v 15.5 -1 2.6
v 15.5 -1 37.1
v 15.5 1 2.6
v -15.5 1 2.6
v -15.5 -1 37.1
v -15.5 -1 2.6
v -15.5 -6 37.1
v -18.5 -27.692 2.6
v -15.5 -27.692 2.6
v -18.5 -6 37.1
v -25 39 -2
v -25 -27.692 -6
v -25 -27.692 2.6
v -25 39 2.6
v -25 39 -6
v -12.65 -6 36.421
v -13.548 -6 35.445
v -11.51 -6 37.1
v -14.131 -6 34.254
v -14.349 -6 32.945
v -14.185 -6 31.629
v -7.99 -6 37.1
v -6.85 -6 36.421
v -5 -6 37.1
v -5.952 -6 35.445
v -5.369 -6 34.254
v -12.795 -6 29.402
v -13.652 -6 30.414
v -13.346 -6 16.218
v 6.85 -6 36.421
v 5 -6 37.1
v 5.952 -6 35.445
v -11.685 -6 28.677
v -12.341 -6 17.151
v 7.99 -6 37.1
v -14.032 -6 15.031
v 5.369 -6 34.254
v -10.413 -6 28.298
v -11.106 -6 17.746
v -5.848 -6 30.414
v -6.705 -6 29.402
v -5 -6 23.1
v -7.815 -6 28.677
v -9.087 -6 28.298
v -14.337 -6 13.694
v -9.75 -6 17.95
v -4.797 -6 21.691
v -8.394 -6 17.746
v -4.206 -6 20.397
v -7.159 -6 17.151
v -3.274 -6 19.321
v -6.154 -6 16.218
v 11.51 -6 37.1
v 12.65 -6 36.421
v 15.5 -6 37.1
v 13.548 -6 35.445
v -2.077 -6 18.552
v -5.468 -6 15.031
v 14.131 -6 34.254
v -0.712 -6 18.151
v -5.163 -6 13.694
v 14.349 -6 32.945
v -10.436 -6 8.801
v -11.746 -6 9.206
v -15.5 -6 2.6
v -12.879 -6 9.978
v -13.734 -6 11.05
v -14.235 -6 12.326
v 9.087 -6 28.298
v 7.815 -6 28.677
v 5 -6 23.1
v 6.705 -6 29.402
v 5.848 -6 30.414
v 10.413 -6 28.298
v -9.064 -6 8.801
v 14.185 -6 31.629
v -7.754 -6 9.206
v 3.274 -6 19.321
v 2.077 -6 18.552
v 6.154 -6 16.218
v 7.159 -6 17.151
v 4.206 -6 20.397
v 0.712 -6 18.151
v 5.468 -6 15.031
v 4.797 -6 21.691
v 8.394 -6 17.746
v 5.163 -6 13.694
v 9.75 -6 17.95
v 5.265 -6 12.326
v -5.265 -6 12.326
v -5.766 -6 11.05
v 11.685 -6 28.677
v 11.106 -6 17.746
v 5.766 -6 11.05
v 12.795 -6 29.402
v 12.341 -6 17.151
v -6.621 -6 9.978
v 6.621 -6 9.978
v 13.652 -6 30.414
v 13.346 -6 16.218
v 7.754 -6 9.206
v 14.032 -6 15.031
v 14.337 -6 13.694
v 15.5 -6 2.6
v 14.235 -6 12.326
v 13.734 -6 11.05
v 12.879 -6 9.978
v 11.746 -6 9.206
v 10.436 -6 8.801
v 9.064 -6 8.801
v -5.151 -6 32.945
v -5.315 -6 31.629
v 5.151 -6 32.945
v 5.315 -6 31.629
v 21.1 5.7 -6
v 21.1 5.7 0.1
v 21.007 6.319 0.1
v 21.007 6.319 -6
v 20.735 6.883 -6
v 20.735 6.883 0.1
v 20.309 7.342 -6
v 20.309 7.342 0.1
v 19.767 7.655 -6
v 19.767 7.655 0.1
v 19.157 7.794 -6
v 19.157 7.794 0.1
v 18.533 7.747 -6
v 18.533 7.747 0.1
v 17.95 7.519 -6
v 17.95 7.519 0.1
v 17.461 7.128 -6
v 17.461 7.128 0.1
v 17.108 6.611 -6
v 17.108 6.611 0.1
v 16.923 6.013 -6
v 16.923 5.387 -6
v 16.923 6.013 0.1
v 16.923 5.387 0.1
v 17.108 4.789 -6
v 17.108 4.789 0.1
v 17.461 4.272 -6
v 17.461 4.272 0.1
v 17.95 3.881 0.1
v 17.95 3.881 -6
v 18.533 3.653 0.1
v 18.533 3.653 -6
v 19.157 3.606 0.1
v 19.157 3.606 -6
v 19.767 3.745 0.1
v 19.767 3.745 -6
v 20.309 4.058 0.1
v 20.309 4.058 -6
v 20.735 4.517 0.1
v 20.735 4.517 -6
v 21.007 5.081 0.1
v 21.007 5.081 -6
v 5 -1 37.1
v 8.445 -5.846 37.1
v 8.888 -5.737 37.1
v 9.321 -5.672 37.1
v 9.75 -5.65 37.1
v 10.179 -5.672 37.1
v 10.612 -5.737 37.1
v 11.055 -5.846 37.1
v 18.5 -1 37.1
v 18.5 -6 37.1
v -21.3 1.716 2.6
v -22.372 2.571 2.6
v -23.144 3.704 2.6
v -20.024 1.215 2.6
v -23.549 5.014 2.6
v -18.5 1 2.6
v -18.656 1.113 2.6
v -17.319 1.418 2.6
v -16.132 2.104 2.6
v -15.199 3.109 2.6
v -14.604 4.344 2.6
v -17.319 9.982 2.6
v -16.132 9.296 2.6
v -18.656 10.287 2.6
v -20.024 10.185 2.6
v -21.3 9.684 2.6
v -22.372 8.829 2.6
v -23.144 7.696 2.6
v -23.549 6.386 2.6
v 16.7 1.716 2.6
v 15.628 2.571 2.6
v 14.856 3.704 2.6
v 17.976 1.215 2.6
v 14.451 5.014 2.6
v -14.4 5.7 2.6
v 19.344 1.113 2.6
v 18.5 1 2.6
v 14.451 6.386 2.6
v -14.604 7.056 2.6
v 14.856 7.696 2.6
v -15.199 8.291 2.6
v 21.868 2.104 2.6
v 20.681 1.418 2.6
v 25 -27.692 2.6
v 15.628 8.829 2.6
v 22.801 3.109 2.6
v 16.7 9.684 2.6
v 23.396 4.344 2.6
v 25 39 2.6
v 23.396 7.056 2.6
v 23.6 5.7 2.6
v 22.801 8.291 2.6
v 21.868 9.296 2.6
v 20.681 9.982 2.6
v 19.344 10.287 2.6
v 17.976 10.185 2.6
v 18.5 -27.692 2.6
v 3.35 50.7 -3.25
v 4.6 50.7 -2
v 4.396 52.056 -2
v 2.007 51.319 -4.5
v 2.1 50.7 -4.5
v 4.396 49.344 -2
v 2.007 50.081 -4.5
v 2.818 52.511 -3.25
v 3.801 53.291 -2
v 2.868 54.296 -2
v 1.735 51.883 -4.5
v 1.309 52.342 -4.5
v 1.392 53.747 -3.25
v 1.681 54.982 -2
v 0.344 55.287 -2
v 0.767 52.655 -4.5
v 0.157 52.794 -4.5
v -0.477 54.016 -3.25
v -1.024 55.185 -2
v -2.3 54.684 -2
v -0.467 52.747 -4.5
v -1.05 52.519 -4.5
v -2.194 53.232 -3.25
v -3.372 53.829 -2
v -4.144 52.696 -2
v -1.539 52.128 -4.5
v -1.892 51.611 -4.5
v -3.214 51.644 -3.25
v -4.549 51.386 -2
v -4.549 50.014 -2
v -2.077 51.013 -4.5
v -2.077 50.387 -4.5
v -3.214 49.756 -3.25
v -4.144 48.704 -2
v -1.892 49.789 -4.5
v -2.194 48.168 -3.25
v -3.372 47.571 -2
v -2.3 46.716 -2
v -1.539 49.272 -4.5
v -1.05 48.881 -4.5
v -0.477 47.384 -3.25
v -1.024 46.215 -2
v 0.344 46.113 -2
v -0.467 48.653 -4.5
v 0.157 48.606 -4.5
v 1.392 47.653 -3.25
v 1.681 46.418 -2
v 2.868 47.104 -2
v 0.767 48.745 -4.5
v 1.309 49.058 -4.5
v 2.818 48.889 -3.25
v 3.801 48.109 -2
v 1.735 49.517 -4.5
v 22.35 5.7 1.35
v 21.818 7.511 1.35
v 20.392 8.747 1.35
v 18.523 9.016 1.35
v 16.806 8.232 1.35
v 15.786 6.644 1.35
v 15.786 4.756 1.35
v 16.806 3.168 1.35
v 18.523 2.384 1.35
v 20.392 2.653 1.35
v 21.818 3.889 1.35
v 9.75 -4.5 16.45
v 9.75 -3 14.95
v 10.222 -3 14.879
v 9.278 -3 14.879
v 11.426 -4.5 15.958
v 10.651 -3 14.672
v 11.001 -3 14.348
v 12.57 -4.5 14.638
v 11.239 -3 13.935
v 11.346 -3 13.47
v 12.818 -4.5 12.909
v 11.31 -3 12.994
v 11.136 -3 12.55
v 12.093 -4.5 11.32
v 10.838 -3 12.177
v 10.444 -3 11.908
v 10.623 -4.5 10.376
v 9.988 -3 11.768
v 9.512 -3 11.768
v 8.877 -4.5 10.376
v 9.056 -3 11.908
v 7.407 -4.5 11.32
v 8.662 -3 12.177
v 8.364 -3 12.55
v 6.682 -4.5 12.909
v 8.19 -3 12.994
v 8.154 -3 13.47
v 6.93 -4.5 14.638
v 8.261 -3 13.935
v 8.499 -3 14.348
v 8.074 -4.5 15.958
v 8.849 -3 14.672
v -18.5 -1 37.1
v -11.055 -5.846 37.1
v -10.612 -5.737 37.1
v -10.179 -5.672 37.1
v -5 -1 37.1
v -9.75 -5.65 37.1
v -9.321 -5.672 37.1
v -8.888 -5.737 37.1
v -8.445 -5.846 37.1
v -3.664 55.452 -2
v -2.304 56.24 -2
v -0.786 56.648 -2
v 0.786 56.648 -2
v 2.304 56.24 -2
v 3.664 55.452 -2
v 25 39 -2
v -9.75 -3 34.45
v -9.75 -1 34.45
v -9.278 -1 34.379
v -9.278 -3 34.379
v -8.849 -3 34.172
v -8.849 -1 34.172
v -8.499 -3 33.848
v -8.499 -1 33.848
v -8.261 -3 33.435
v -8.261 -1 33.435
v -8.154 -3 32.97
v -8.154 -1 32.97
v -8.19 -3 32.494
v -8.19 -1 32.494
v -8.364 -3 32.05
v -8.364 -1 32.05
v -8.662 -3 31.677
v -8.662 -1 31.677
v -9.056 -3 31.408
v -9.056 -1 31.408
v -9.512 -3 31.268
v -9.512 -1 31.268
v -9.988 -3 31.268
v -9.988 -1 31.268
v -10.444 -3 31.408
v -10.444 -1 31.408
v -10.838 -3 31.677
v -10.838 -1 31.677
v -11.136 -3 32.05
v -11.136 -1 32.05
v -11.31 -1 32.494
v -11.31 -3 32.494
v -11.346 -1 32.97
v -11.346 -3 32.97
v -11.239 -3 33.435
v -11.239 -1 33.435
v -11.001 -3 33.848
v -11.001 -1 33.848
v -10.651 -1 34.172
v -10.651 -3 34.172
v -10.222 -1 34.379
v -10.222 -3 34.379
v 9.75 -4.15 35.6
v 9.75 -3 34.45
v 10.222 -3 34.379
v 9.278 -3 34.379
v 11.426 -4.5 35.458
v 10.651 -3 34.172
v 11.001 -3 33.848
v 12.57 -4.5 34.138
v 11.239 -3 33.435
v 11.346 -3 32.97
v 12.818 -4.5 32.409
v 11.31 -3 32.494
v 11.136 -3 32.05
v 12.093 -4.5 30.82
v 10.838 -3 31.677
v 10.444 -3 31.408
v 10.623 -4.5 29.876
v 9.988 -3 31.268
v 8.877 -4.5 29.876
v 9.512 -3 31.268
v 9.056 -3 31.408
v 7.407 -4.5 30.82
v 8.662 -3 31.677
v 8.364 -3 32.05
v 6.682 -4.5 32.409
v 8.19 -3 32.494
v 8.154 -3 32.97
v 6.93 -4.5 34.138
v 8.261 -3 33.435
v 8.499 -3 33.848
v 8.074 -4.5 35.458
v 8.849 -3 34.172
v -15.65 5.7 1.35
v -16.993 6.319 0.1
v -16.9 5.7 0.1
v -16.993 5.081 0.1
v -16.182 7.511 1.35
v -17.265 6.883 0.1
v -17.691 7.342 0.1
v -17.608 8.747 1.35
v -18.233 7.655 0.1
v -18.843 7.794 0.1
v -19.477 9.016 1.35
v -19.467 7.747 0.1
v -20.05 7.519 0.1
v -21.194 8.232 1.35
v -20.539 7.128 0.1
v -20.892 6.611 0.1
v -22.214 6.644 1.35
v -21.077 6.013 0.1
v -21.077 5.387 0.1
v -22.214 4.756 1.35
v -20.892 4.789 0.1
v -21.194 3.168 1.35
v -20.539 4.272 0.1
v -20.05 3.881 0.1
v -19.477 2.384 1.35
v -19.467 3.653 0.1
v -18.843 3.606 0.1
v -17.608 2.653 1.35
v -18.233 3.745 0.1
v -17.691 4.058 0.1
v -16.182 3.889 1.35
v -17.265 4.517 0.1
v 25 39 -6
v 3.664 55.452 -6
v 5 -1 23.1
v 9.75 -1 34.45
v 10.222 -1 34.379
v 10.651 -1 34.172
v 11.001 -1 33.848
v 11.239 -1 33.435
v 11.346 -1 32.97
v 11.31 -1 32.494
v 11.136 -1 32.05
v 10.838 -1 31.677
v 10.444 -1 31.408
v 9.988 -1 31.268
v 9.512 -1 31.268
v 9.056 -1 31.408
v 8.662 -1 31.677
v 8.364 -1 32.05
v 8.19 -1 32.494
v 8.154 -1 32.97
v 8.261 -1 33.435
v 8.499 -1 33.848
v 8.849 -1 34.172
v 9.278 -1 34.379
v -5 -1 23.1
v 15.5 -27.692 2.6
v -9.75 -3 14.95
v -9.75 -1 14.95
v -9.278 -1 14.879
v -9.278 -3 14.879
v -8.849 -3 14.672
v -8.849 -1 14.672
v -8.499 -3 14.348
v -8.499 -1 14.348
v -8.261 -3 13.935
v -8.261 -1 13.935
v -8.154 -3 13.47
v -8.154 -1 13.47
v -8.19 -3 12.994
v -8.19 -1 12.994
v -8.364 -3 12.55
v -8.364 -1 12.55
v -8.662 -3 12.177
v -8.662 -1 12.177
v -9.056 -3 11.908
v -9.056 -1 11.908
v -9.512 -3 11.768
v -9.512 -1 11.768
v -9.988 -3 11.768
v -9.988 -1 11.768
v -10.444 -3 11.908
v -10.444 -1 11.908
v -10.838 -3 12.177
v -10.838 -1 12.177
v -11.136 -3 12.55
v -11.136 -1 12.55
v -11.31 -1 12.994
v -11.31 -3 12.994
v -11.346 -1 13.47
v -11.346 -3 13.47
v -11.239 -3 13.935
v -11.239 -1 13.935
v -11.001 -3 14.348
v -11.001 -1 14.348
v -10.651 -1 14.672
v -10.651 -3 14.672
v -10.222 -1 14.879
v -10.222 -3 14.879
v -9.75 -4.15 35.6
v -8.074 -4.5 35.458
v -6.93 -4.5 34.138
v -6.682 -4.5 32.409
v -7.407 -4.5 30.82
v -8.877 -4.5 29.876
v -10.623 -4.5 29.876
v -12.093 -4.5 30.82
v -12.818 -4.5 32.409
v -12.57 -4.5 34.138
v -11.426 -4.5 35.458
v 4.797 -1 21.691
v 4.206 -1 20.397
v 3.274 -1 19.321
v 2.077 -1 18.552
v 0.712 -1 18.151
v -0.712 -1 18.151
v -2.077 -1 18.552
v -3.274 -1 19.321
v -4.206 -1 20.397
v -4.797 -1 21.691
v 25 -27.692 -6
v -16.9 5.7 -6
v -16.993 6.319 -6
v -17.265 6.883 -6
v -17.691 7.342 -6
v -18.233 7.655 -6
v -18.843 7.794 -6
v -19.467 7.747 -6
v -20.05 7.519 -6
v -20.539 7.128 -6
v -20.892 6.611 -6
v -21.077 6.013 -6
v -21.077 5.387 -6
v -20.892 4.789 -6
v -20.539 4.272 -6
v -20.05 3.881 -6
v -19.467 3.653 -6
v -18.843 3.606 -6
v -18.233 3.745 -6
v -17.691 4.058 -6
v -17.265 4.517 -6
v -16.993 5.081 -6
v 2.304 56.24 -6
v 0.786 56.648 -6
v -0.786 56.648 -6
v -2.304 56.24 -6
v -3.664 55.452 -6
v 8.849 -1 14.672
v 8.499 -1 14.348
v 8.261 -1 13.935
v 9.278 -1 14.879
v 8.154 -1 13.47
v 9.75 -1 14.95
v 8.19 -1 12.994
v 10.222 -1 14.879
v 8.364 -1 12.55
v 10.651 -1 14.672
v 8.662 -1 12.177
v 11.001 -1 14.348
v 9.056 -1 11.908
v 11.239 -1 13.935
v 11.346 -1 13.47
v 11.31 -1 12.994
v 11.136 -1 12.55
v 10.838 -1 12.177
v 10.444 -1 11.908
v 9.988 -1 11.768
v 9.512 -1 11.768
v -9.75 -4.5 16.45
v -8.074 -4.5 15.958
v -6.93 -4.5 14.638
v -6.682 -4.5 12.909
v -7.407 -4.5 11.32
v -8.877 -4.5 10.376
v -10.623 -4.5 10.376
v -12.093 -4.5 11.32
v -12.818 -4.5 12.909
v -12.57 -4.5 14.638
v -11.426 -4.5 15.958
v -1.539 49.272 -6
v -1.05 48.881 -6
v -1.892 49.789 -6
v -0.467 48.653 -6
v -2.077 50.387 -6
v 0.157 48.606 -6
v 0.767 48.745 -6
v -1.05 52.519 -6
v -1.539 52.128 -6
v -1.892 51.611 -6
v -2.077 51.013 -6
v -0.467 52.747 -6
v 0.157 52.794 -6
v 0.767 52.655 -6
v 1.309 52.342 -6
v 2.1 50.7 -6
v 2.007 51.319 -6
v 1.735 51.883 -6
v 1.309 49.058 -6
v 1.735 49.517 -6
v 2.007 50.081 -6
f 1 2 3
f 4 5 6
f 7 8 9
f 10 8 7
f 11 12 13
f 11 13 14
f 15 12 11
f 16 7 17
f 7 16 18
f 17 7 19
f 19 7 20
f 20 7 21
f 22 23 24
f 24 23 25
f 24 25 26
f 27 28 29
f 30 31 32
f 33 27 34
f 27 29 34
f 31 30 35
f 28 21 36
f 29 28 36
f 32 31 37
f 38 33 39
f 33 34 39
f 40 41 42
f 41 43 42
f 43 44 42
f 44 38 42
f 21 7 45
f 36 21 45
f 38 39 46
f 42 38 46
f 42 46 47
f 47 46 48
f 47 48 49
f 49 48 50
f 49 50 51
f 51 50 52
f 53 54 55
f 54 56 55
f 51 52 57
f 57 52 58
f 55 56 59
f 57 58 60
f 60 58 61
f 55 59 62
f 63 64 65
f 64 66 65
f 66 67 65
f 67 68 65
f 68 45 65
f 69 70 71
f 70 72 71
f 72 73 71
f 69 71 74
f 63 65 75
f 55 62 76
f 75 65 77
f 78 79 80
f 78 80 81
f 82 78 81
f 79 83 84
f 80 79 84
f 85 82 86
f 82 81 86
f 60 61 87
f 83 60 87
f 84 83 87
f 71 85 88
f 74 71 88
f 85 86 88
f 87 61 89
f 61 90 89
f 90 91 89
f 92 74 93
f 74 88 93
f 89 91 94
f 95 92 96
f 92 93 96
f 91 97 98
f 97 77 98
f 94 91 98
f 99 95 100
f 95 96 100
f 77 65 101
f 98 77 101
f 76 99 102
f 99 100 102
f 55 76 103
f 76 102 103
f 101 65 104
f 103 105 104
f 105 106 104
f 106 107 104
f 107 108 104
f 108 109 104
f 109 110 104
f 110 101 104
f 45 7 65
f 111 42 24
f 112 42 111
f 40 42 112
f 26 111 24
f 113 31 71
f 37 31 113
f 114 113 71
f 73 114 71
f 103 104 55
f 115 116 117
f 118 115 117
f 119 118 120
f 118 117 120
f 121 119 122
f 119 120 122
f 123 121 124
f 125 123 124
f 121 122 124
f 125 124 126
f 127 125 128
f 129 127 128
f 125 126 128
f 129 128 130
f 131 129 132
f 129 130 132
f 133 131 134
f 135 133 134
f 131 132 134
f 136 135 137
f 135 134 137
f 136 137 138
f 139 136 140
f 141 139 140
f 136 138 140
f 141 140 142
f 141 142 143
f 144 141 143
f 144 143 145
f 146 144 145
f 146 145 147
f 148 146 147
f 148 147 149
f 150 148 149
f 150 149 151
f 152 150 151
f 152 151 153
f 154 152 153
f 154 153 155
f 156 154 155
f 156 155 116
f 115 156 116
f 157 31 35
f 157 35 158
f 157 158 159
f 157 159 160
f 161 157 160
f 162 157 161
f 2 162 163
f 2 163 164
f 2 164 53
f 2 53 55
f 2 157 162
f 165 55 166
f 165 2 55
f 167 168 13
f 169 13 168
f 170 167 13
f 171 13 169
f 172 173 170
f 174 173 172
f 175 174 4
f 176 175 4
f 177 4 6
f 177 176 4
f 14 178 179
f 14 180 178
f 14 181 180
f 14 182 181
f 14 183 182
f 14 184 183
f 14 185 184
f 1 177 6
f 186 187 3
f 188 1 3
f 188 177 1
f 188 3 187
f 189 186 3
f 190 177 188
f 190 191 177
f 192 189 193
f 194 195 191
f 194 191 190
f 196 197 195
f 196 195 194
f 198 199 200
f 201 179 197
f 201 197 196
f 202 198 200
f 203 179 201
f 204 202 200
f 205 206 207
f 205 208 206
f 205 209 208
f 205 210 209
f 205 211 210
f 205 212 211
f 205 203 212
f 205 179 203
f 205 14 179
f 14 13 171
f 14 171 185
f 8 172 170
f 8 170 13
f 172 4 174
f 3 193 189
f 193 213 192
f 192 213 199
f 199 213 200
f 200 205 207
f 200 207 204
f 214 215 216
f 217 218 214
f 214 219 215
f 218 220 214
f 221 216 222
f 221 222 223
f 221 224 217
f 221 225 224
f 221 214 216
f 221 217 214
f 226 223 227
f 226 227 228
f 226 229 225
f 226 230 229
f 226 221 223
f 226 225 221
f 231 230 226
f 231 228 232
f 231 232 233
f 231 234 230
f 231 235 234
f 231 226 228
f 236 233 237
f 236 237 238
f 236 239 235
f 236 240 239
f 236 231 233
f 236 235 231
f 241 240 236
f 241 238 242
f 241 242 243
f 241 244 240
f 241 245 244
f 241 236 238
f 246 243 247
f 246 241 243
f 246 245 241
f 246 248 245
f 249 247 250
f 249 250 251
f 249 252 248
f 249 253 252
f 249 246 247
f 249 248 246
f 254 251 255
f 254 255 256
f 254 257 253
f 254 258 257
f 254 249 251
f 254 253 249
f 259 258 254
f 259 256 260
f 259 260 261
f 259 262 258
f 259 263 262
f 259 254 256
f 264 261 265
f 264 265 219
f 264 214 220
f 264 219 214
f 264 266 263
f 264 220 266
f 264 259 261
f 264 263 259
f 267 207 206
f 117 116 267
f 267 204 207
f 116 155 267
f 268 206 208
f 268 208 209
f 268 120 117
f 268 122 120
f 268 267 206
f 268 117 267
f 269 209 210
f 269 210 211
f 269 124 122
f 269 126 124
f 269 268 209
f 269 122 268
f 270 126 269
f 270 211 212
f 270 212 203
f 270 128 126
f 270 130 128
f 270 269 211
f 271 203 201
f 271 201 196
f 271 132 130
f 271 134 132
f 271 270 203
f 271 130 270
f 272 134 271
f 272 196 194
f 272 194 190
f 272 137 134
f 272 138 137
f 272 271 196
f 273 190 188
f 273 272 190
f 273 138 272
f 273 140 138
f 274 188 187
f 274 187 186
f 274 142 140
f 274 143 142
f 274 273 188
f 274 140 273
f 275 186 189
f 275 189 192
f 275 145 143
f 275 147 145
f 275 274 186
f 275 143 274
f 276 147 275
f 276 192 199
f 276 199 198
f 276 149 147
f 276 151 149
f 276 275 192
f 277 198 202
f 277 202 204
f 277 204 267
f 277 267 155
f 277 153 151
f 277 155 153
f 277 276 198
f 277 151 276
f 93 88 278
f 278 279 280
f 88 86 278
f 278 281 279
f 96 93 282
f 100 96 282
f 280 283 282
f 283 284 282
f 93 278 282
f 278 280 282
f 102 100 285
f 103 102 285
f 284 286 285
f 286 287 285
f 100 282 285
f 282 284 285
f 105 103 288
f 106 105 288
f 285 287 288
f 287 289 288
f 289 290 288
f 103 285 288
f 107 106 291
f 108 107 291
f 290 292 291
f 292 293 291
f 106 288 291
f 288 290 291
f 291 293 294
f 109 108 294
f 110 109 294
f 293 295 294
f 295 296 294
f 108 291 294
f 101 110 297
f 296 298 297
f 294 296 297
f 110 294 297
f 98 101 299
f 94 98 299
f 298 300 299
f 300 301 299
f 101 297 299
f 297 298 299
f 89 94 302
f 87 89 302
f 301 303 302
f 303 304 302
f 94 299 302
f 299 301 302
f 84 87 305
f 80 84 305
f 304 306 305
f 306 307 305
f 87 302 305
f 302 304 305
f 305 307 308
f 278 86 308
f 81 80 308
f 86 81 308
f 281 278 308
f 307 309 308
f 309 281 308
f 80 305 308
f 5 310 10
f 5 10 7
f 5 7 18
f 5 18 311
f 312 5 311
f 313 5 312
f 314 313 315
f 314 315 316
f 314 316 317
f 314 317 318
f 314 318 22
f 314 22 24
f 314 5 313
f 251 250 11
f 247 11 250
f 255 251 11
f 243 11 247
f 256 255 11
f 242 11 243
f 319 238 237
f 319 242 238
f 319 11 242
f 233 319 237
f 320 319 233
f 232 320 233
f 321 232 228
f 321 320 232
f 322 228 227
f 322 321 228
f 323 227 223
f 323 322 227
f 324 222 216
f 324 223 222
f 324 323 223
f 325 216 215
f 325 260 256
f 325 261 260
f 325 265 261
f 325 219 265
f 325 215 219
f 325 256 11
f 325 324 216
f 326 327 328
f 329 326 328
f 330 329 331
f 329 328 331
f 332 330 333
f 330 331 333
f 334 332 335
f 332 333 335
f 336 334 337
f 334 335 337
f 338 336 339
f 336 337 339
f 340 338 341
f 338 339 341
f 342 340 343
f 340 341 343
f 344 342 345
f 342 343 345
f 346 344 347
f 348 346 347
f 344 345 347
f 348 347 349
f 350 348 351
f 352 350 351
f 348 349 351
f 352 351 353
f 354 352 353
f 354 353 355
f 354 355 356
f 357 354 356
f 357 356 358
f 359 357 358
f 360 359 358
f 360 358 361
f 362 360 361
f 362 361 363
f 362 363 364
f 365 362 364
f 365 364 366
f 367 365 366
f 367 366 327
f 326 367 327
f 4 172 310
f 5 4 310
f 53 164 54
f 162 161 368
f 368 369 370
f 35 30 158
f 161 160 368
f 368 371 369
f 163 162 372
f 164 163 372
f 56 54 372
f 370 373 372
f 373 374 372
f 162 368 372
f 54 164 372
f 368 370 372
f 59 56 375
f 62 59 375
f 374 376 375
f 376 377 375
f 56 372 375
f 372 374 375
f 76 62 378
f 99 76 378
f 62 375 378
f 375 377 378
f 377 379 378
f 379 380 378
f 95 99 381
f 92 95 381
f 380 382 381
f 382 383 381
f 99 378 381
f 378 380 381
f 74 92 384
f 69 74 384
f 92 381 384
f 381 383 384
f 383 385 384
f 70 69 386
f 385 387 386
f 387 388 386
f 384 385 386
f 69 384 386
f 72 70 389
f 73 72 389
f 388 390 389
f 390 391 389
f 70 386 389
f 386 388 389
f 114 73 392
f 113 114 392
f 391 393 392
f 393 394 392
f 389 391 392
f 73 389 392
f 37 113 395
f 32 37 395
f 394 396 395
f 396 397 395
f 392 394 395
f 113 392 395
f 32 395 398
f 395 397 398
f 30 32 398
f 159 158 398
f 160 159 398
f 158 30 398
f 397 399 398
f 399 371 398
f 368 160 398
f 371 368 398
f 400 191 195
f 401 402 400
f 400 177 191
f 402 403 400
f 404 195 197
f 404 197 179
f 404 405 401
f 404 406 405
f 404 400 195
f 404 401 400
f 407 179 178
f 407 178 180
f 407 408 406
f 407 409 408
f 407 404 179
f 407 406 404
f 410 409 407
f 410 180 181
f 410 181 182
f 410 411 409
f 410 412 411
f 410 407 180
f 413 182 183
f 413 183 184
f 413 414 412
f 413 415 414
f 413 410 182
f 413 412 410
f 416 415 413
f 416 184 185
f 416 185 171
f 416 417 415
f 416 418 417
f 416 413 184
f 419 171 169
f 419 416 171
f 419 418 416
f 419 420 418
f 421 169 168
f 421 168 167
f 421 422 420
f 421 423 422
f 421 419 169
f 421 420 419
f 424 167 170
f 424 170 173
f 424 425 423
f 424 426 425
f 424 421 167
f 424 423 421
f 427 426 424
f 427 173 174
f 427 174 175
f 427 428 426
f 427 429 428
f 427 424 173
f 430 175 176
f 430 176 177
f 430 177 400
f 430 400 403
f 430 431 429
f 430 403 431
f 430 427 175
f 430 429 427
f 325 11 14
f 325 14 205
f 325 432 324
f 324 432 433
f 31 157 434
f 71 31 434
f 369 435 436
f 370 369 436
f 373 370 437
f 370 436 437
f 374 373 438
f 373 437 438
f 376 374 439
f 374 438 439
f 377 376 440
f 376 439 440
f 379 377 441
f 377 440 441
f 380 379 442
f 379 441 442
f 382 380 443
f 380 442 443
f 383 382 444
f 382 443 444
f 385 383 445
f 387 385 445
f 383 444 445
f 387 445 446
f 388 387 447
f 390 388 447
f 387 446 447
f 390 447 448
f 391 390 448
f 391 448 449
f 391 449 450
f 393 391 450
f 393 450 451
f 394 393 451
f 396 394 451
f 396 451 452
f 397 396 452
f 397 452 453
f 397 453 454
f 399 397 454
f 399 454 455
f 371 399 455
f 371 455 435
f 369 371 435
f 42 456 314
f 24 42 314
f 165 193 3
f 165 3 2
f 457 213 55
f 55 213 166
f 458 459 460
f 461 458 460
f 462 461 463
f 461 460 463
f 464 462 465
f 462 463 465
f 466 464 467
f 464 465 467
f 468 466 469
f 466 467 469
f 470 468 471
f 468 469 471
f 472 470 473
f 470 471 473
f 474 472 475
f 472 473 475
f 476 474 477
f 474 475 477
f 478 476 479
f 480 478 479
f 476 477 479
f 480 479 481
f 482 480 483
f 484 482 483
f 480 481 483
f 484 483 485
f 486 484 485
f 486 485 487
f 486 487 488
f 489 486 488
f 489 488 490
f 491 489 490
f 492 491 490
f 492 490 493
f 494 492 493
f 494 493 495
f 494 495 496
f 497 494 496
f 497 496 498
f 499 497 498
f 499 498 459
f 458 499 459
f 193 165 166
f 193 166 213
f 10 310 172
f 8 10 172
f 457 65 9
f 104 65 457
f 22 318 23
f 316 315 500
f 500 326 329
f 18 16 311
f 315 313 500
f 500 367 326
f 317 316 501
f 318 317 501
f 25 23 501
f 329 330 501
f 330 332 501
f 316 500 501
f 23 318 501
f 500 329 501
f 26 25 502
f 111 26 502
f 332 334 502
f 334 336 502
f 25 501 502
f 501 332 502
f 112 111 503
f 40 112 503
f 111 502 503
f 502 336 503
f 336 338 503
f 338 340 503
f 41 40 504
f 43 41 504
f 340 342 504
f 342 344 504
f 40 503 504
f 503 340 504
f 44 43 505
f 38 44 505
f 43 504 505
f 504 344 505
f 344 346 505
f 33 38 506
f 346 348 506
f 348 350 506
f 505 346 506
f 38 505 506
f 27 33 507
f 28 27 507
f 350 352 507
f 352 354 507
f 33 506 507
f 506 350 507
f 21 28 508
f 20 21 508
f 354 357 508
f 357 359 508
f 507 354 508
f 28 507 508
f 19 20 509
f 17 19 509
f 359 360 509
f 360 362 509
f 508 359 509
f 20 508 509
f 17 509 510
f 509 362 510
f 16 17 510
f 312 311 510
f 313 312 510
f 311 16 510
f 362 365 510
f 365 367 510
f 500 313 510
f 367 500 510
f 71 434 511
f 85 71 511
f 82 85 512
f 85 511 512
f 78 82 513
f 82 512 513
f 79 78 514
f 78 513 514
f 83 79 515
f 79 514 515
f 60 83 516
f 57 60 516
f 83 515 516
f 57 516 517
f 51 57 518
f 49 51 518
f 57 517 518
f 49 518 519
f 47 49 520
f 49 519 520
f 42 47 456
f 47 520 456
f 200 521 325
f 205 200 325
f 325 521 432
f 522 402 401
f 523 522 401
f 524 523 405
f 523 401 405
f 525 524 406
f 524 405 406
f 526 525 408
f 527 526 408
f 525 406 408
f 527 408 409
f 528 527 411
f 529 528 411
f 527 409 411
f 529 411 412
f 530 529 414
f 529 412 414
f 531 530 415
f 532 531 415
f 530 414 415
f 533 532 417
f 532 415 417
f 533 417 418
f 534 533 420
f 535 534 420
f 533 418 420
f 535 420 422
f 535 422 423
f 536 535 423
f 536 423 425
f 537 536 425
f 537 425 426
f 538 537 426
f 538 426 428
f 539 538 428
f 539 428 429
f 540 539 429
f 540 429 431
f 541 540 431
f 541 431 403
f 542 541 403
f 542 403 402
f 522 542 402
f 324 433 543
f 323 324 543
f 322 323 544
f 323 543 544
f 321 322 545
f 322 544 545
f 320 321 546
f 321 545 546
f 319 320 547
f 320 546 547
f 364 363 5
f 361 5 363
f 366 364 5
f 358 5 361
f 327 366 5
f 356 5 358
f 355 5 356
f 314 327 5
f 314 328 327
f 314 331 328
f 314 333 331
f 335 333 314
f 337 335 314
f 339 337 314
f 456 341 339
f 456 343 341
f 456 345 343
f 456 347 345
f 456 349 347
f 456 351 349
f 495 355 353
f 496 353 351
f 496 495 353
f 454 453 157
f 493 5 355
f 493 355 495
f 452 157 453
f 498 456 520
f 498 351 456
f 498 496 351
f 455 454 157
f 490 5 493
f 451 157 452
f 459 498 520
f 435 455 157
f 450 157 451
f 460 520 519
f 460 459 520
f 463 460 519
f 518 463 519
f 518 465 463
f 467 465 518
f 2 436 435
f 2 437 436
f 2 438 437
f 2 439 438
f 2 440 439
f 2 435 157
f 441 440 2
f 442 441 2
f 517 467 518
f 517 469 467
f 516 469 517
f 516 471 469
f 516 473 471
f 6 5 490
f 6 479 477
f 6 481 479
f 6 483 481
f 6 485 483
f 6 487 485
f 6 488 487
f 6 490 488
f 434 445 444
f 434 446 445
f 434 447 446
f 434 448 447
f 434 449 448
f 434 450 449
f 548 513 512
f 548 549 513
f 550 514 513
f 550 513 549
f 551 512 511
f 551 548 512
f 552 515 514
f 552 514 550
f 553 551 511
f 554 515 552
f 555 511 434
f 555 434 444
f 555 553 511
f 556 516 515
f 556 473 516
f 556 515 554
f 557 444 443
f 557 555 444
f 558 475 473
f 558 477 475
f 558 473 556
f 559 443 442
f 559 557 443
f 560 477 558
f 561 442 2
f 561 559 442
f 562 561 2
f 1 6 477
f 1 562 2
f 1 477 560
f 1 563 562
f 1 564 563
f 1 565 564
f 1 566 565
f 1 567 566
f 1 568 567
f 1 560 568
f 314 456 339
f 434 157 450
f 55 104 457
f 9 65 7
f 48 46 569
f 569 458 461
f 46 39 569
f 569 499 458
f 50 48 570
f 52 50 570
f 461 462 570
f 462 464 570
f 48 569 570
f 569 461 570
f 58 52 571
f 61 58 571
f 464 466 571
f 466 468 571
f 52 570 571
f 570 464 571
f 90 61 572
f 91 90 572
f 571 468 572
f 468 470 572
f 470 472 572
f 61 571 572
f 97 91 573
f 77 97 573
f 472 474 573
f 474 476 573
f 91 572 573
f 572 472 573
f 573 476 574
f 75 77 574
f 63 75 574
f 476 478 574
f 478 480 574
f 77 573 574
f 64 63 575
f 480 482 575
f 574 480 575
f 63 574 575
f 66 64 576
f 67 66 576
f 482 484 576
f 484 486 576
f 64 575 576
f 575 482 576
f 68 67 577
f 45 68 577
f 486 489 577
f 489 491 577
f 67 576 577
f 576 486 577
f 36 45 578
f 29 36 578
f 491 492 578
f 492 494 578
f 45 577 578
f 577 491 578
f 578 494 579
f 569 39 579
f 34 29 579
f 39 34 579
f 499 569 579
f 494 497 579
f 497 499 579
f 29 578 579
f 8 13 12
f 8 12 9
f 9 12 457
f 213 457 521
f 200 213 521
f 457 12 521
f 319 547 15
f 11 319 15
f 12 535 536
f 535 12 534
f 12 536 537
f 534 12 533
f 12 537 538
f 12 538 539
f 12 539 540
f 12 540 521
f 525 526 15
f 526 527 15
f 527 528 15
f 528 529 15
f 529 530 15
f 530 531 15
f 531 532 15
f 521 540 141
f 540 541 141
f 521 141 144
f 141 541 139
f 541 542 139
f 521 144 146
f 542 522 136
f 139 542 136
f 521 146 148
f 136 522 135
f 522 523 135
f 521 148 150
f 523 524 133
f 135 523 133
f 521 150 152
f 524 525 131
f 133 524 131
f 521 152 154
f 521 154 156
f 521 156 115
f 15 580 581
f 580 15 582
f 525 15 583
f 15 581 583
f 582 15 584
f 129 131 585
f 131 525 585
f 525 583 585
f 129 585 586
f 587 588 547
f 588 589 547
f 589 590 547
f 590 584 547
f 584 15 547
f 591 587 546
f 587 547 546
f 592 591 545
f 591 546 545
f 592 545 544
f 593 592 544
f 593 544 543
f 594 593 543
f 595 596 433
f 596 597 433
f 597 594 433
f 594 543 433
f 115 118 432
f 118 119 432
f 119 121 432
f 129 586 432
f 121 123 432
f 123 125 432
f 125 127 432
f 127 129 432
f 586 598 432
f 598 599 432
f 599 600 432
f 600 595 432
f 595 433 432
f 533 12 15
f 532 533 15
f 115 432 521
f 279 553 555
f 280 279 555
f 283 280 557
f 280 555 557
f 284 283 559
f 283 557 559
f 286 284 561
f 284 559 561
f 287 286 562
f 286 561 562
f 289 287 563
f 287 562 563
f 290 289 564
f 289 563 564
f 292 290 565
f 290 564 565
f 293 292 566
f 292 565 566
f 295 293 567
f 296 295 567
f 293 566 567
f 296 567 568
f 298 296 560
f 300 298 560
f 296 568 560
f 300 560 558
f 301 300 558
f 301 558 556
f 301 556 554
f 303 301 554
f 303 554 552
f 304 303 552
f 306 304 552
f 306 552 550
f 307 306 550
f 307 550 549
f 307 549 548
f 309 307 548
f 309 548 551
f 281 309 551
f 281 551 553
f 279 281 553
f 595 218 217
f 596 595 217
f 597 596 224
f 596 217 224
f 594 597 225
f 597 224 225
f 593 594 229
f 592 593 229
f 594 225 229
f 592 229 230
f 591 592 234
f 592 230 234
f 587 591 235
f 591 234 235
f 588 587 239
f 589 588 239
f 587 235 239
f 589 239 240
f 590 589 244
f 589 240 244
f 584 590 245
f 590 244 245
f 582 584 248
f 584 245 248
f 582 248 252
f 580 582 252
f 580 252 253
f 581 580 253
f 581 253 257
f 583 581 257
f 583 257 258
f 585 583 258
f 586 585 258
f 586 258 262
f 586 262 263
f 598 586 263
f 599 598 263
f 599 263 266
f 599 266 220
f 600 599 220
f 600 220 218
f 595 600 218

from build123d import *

# Parameters (mm, degrees)
BOSS_EXTRUDE1_DEPTH      = 2.6
BOSS_EXTRUDE1_DEPTH_BACK = 6
SKETCH3_W                = 50
SKETCH3_H                = 66.691620804
BOSS_EXTRUDE2_DEPTH      = 4
SKETCH8_R                = 2.1
CUT_EXTRUDE4_DEPTH       = 63.560770456
CHAMFER1_SIZE            = 2.5
SKETCH9_W                = 37
SKETCH9_H                = 5
BOSS_EXTRUDE3_DEPTH      = 34.5
SKETCH10_R               = 1.6
CUT_EXTRUDE5_DEPTH       = 74.011642907
BOSS_EXTRUDE4_DEPTH      = 3
CHAMFER2_SIZE            = 3


with BuildPart() as part:
    # Sketch3 → Boss-Extrude1 (new, two sides: drawn at the far end of the back side and taken through both)
    with BuildSketch(Plane.XY.offset(-BOSS_EXTRUDE1_DEPTH_BACK)):
        with Locations((0, 5.654189598)):
            Rectangle(SKETCH3_W, SKETCH3_H)
    extrude(amount=BOSS_EXTRUDE1_DEPTH + BOSS_EXTRUDE1_DEPTH_BACK)

    # Sketch7 → Boss-Extrude2 (add)
    with BuildSketch(Plane(origin=(0, 0, -6), x_dir=(-1, 0, 0), z_dir=(0, 0, -1))):
        with BuildLine():
            Line((-25, 39), (-3.663721376, 55.451541401))
            ThreePointArc((-3.663721376, 55.451541401), (0, 56.7), (3.663721376, 55.451541401))
            Line((3.663721376, 55.451541401), (25, 39))
            Line((25, 39), (-25, 39))
        make_face()
    extrude(amount=-BOSS_EXTRUDE2_DEPTH)

    # Sketch8 → Cut-Extrude4 (cut, through all)
    with BuildSketch(Plane.XY.offset(2.6)):
        with Locations((-19, 5.7)):
            Circle(SKETCH8_R)
        with Locations((19, 5.7)):
            Circle(SKETCH8_R)
        with Locations((0, 50.7)):
            Circle(SKETCH8_R)
    extrude(amount=-CUT_EXTRUDE4_DEPTH, mode=Mode.SUBTRACT)

    # Chamfer1
    chamfer1_edges = [part.edges().sort_by_distance(p)[0] for p in [
        (-21.1, 5.7, 2.6),
        (16.9, 5.7, 2.6),
        (-2.1, 50.7, -2),
    ]]
    chamfer(chamfer1_edges, length=CHAMFER1_SIZE)

    # Sketch9 → Boss-Extrude3 (add)
    with BuildSketch(Plane.XY.offset(2.6)):
        with Locations((0, -3.5)):
            Rectangle(SKETCH9_W, SKETCH9_H)
    extrude(amount=BOSS_EXTRUDE3_DEPTH)

    # Sketch10 → Cut-Extrude5 (cut, through all)
    with BuildSketch(Plane(origin=(0, -1, 0), x_dir=(1, 0, 0), z_dir=(0, 1, 0))):
        with Locations(Location((9.75, -13.35, 0), (0, 0, 270))):
            Circle(SKETCH10_R)
        with Locations(Location((9.75, -32.85, 0), (0, 0, 270))):
            Circle(SKETCH10_R)
        with Locations(Location((-9.75, -32.85, 0), (0, 0, 270))):
            Circle(SKETCH10_R)
        with Locations(Location((-9.75, -13.35, 0), (0, 0, 270))):
            Circle(SKETCH10_R)
        with BuildLine():
            Line((-5, -23.1), (-5, -37.1))
            Line((-5, -37.1), (5, -37.1))
            Line((5, -37.1), (5, -23.1))
            ThreePointArc((5, -23.1), (0, -18.1), (-5, -23.1))
        make_face()
    extrude(amount=-CUT_EXTRUDE5_DEPTH, mode=Mode.SUBTRACT)

    # Sketch11 → Boss-Extrude4 (add)
    with BuildSketch(Plane.ZY.offset(18.5)):
        Polygon((2.6, -1), (2.6, 1), (37.1, -1), align=None)
        Polygon((2.6, -6), (2.6, -27.691620804), (37.1, -6), align=None)
    boss_extrude4 = extrude(amount=-BOSS_EXTRUDE4_DEPTH)

    # Mirror1: Boss-Extrude4 across plane
    add(boss_extrude4.mirror(Plane(origin=(0, 0, 0), x_dir=(0, 0, 1), z_dir=(1, 0, 0))))

    # Chamfer2
    # the kernel refuses this chamfer: 3 mm, written as the material it takes off along each edge
    with BuildSketch(Plane(origin=(9.75, -6, 32.85), x_dir=(0, 0, 1), z_dir=(-1, 0, 0))) as chamfer2_piece_1:
        Polygon((1.6 + CHAMFER2_SIZE, 0), (1.6, CHAMFER2_SIZE), (1.6, 0), align=None)
    revolve(axis=Axis((9.75, -6, 32.85), (0, 1, 0)), mode=Mode.SUBTRACT)
    with BuildSketch(Plane(origin=(-9.75, -6, 32.85), x_dir=(0, 0, 1), z_dir=(-1, 0, 0))) as chamfer2_piece_2:
        Polygon((1.6 + CHAMFER2_SIZE, 0), (1.6, CHAMFER2_SIZE), (1.6, 0), align=None)
    revolve(axis=Axis((-9.75, -6, 32.85), (0, 1, 0)), mode=Mode.SUBTRACT)
    with BuildSketch(Plane(origin=(-9.75, -6, 13.35), x_dir=(0, 0, 1), z_dir=(-1, 0, 0))) as chamfer2_piece_3:
        Polygon((1.6 + CHAMFER2_SIZE, 0), (1.6, CHAMFER2_SIZE), (1.6, 0), align=None)
    revolve(axis=Axis((-9.75, -6, 13.35), (0, 1, 0)), mode=Mode.SUBTRACT)
    with BuildSketch(Plane(origin=(9.75, -6, 13.35), x_dir=(0, 0, 1), z_dir=(-1, 0, 0))) as chamfer2_piece_4:
        Polygon((1.6 + CHAMFER2_SIZE, 0), (1.6, CHAMFER2_SIZE), (1.6, 0), align=None)
    revolve(axis=Axis((9.75, -6, 13.35), (0, 1, 0)), mode=Mode.SUBTRACT)


solid = part.part
